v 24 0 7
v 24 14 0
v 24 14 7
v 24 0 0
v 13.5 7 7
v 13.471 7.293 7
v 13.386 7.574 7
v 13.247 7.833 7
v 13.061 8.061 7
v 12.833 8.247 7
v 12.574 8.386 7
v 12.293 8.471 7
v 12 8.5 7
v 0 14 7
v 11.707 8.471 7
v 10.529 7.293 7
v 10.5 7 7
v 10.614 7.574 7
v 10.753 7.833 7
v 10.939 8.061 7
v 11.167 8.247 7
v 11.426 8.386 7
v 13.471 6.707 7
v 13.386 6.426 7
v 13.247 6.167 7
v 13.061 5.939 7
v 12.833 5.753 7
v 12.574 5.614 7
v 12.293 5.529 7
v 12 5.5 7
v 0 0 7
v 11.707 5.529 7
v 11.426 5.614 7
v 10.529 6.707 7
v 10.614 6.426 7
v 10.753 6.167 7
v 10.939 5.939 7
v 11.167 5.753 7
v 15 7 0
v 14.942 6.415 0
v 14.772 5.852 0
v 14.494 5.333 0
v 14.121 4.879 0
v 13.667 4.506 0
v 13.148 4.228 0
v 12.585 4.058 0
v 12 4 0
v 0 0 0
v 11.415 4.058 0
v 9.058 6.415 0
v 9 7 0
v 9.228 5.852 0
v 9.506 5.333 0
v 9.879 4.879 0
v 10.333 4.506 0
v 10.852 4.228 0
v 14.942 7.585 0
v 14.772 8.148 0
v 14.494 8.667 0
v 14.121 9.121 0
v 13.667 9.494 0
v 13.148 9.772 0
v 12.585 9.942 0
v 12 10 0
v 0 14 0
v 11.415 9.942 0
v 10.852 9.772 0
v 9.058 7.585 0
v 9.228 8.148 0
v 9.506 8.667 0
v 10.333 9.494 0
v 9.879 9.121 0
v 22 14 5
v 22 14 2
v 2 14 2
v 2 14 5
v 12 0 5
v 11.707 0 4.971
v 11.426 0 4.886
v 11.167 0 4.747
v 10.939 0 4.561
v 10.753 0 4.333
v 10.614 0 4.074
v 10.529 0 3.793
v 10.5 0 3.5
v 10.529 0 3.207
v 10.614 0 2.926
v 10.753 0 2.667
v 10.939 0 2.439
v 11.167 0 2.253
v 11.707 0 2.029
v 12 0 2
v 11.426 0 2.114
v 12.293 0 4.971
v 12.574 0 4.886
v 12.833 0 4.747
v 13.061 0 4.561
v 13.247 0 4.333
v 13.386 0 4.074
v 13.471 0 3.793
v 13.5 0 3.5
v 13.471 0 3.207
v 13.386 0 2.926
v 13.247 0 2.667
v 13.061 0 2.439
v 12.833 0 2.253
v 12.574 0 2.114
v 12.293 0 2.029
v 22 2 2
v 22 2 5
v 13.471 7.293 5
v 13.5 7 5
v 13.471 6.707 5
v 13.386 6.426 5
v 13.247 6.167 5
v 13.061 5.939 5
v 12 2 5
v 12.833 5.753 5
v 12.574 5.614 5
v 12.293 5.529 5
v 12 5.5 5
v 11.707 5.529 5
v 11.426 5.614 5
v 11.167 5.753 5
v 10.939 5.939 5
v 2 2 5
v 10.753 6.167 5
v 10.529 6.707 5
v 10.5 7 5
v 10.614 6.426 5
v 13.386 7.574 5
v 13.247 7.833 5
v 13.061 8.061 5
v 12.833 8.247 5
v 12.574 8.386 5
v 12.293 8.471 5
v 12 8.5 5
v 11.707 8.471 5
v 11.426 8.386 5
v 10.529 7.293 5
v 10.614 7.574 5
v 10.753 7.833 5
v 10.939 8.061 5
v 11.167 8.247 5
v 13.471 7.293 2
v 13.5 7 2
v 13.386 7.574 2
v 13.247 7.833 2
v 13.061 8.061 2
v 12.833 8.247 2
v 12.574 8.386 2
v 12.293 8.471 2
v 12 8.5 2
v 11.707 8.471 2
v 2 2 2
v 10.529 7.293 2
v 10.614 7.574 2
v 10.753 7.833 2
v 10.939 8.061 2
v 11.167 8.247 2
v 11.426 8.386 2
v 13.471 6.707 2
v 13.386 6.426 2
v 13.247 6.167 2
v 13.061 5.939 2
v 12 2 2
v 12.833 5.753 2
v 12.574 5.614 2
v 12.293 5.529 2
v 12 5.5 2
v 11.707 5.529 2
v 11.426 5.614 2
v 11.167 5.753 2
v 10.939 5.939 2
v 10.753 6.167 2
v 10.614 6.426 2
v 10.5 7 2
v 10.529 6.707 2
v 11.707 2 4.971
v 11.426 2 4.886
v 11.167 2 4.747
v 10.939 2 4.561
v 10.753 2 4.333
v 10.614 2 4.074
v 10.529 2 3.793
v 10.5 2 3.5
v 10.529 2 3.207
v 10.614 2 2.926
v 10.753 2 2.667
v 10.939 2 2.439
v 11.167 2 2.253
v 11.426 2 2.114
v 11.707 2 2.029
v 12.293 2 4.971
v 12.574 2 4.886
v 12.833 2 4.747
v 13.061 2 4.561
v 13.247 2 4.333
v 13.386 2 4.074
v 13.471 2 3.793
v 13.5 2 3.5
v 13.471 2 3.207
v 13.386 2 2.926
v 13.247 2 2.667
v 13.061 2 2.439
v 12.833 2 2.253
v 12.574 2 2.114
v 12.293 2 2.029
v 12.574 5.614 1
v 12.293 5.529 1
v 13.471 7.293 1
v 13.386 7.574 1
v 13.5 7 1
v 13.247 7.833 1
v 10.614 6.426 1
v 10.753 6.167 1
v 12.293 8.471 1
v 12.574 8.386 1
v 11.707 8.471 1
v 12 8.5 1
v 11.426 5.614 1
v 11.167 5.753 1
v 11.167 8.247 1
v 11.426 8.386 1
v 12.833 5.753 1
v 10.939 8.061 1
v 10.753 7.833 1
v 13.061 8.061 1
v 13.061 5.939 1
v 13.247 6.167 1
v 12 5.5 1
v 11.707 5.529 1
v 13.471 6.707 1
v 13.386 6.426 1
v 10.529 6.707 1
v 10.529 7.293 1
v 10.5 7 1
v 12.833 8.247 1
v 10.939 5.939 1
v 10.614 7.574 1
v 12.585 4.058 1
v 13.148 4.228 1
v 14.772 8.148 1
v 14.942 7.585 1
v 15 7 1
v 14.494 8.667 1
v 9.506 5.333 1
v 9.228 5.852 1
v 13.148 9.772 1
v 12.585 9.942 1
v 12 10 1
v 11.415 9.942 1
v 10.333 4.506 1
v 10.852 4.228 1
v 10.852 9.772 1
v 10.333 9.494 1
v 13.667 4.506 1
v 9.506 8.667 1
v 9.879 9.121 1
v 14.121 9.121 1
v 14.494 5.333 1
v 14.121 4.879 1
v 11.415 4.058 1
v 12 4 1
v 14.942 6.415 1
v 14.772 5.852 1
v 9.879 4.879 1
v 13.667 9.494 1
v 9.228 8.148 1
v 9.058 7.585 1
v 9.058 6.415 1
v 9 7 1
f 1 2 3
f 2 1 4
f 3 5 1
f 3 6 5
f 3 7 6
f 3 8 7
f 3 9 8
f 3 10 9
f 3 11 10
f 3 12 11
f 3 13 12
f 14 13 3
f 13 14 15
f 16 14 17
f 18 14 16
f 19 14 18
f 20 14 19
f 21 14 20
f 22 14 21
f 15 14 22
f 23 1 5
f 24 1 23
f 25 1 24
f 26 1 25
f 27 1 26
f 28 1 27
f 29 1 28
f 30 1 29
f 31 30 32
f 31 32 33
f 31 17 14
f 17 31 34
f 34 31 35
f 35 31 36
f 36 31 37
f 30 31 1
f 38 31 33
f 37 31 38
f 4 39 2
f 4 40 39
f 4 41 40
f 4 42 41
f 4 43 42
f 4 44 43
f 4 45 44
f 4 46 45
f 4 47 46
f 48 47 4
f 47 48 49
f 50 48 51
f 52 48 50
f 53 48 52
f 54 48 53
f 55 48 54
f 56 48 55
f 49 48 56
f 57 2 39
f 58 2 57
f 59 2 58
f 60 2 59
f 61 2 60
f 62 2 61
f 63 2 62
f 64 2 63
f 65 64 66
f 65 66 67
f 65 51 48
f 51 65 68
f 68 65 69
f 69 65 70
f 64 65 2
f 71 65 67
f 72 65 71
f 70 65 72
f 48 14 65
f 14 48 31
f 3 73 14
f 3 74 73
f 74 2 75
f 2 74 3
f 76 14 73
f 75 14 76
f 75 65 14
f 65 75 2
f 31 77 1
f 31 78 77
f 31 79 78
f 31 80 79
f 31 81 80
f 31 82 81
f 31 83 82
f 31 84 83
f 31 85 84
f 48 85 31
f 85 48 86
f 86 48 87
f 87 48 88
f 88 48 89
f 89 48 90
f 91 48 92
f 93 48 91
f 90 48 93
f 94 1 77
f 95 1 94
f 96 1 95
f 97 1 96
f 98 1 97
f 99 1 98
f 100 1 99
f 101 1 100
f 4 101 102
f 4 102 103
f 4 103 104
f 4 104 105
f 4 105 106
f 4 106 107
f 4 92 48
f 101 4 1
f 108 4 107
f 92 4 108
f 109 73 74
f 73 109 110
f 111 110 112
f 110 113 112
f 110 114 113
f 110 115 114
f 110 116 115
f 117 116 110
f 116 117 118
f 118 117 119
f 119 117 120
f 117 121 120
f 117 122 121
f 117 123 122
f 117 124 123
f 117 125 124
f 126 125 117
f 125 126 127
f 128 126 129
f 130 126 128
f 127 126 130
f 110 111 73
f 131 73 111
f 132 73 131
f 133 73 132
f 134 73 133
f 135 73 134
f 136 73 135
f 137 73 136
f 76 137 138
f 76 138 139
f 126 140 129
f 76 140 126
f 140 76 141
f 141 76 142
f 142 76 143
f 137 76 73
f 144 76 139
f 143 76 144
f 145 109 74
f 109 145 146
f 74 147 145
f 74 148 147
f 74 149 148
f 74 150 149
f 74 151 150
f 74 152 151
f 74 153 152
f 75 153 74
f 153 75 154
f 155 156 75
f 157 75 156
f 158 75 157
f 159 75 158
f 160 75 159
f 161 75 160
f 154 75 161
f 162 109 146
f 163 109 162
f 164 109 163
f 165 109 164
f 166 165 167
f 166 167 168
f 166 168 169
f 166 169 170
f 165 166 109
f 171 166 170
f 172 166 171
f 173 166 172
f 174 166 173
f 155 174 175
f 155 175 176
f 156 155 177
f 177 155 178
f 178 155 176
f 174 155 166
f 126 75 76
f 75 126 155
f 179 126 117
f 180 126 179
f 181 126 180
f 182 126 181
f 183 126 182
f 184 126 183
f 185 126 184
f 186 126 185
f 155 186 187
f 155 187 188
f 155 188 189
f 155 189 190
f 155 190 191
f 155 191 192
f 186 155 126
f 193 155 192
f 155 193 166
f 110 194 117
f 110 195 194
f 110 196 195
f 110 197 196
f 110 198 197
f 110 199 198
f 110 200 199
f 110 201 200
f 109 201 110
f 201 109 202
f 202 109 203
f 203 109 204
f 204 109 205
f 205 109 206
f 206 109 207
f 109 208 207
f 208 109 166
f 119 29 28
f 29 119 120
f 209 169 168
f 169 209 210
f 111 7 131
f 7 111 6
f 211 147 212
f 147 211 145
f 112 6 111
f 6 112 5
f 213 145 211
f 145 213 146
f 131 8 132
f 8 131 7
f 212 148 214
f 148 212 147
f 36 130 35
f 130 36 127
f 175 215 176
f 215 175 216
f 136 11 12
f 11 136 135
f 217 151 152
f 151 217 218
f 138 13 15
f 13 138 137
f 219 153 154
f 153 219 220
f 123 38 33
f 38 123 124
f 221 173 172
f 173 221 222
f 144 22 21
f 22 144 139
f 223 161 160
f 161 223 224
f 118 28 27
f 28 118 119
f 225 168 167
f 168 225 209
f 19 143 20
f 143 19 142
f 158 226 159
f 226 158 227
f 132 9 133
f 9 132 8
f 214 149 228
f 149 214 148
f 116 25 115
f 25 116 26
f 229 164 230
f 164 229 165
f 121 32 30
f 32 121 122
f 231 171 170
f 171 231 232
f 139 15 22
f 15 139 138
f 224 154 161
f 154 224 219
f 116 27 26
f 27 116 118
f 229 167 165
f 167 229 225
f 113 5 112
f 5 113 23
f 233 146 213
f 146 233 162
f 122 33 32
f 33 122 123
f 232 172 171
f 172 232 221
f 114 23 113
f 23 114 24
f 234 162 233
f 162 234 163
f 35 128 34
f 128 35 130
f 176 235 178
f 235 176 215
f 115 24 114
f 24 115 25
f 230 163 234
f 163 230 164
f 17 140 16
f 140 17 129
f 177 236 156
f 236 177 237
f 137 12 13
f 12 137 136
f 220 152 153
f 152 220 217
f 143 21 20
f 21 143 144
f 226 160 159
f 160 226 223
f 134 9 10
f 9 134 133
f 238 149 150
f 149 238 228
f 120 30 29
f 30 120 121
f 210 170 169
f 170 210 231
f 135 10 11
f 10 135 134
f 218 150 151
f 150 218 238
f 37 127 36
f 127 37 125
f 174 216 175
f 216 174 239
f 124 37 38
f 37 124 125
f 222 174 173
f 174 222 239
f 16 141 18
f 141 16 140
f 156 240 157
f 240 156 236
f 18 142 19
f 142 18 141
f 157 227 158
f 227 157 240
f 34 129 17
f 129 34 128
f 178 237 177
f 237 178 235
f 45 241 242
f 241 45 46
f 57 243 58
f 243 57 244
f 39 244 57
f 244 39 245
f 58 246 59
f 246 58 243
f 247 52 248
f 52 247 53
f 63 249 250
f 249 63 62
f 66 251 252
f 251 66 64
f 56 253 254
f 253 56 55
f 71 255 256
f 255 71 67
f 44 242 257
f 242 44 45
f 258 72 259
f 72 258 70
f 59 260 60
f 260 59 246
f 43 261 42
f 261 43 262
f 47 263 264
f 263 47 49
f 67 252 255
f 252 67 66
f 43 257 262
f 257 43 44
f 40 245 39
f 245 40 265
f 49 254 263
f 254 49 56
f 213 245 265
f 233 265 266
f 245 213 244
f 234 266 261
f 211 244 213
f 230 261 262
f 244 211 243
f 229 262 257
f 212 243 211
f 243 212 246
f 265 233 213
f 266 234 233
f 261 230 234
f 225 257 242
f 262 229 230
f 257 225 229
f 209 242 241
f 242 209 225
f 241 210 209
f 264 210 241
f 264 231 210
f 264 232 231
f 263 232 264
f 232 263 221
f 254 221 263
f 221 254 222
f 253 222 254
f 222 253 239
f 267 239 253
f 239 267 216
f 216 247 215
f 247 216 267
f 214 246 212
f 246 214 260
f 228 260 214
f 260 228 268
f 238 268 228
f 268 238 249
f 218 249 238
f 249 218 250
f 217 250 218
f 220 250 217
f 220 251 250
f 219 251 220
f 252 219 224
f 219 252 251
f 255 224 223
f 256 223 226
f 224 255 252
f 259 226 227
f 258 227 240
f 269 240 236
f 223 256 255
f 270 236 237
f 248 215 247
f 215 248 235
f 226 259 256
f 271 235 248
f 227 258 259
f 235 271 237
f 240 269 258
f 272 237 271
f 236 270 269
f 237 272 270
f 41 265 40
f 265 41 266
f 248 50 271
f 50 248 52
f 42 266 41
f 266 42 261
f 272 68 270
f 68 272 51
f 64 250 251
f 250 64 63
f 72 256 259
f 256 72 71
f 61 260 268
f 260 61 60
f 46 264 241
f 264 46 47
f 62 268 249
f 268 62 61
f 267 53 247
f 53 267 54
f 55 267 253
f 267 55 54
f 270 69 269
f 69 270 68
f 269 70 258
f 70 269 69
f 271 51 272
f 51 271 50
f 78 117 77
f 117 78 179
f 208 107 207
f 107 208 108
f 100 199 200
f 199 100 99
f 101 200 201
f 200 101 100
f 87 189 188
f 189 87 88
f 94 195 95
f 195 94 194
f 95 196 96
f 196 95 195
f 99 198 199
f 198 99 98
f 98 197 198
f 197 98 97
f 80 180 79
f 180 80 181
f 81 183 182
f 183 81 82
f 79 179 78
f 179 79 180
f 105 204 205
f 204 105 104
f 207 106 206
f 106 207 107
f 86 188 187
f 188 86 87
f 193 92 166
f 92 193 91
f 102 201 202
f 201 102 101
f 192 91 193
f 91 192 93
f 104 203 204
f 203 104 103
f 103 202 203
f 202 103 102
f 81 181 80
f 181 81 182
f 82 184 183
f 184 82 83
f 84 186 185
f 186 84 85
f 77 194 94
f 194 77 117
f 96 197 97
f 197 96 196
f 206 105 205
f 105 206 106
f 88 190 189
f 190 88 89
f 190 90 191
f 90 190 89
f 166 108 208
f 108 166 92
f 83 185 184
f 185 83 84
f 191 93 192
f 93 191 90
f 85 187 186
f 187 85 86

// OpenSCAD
strapW=20;
strapT=3;

capT=2;
capW=12;

capX=strapW+capT*2;
capY=capW+capT;
capZ=strapT+capT*2;

color("silver") {
  difference() {
    cube([capX,capY,capZ]);
    translate([capT,capT,capT]) strap();
    translate([capX/2,capY/2,-1]) cylinder(r=1.5,h=100, $fn=32);
    translate([capX/2,capY/2,-1]) cylinder(r=3,h=2, $fn=32);
    translate([capX/2,capT+0.1,capZ/2]) rotate([90,0,0]) cylinder(r=strapT/2,h=10, $fn=32);
  }

 // translate([capX/2,-11,capZ/2]) ring();
}

module strap() {
  color("brown") cube([strapW,500,strapT]);
}

module ring() {
  scale([1,1,0.5]) torus(10,4);
  translate([0,15,0]) rotate([90,0,0]) cylinder(r=strapT/2-0.1,h=5, $fn=32);
}

module torus(r1,r2) {
  rotate([0,0,360/20]) rotate_extrude(convexity = 10, $fn=5)
    translate([r1, 0, 0])
    circle(r = r2, $fn=32);
}
